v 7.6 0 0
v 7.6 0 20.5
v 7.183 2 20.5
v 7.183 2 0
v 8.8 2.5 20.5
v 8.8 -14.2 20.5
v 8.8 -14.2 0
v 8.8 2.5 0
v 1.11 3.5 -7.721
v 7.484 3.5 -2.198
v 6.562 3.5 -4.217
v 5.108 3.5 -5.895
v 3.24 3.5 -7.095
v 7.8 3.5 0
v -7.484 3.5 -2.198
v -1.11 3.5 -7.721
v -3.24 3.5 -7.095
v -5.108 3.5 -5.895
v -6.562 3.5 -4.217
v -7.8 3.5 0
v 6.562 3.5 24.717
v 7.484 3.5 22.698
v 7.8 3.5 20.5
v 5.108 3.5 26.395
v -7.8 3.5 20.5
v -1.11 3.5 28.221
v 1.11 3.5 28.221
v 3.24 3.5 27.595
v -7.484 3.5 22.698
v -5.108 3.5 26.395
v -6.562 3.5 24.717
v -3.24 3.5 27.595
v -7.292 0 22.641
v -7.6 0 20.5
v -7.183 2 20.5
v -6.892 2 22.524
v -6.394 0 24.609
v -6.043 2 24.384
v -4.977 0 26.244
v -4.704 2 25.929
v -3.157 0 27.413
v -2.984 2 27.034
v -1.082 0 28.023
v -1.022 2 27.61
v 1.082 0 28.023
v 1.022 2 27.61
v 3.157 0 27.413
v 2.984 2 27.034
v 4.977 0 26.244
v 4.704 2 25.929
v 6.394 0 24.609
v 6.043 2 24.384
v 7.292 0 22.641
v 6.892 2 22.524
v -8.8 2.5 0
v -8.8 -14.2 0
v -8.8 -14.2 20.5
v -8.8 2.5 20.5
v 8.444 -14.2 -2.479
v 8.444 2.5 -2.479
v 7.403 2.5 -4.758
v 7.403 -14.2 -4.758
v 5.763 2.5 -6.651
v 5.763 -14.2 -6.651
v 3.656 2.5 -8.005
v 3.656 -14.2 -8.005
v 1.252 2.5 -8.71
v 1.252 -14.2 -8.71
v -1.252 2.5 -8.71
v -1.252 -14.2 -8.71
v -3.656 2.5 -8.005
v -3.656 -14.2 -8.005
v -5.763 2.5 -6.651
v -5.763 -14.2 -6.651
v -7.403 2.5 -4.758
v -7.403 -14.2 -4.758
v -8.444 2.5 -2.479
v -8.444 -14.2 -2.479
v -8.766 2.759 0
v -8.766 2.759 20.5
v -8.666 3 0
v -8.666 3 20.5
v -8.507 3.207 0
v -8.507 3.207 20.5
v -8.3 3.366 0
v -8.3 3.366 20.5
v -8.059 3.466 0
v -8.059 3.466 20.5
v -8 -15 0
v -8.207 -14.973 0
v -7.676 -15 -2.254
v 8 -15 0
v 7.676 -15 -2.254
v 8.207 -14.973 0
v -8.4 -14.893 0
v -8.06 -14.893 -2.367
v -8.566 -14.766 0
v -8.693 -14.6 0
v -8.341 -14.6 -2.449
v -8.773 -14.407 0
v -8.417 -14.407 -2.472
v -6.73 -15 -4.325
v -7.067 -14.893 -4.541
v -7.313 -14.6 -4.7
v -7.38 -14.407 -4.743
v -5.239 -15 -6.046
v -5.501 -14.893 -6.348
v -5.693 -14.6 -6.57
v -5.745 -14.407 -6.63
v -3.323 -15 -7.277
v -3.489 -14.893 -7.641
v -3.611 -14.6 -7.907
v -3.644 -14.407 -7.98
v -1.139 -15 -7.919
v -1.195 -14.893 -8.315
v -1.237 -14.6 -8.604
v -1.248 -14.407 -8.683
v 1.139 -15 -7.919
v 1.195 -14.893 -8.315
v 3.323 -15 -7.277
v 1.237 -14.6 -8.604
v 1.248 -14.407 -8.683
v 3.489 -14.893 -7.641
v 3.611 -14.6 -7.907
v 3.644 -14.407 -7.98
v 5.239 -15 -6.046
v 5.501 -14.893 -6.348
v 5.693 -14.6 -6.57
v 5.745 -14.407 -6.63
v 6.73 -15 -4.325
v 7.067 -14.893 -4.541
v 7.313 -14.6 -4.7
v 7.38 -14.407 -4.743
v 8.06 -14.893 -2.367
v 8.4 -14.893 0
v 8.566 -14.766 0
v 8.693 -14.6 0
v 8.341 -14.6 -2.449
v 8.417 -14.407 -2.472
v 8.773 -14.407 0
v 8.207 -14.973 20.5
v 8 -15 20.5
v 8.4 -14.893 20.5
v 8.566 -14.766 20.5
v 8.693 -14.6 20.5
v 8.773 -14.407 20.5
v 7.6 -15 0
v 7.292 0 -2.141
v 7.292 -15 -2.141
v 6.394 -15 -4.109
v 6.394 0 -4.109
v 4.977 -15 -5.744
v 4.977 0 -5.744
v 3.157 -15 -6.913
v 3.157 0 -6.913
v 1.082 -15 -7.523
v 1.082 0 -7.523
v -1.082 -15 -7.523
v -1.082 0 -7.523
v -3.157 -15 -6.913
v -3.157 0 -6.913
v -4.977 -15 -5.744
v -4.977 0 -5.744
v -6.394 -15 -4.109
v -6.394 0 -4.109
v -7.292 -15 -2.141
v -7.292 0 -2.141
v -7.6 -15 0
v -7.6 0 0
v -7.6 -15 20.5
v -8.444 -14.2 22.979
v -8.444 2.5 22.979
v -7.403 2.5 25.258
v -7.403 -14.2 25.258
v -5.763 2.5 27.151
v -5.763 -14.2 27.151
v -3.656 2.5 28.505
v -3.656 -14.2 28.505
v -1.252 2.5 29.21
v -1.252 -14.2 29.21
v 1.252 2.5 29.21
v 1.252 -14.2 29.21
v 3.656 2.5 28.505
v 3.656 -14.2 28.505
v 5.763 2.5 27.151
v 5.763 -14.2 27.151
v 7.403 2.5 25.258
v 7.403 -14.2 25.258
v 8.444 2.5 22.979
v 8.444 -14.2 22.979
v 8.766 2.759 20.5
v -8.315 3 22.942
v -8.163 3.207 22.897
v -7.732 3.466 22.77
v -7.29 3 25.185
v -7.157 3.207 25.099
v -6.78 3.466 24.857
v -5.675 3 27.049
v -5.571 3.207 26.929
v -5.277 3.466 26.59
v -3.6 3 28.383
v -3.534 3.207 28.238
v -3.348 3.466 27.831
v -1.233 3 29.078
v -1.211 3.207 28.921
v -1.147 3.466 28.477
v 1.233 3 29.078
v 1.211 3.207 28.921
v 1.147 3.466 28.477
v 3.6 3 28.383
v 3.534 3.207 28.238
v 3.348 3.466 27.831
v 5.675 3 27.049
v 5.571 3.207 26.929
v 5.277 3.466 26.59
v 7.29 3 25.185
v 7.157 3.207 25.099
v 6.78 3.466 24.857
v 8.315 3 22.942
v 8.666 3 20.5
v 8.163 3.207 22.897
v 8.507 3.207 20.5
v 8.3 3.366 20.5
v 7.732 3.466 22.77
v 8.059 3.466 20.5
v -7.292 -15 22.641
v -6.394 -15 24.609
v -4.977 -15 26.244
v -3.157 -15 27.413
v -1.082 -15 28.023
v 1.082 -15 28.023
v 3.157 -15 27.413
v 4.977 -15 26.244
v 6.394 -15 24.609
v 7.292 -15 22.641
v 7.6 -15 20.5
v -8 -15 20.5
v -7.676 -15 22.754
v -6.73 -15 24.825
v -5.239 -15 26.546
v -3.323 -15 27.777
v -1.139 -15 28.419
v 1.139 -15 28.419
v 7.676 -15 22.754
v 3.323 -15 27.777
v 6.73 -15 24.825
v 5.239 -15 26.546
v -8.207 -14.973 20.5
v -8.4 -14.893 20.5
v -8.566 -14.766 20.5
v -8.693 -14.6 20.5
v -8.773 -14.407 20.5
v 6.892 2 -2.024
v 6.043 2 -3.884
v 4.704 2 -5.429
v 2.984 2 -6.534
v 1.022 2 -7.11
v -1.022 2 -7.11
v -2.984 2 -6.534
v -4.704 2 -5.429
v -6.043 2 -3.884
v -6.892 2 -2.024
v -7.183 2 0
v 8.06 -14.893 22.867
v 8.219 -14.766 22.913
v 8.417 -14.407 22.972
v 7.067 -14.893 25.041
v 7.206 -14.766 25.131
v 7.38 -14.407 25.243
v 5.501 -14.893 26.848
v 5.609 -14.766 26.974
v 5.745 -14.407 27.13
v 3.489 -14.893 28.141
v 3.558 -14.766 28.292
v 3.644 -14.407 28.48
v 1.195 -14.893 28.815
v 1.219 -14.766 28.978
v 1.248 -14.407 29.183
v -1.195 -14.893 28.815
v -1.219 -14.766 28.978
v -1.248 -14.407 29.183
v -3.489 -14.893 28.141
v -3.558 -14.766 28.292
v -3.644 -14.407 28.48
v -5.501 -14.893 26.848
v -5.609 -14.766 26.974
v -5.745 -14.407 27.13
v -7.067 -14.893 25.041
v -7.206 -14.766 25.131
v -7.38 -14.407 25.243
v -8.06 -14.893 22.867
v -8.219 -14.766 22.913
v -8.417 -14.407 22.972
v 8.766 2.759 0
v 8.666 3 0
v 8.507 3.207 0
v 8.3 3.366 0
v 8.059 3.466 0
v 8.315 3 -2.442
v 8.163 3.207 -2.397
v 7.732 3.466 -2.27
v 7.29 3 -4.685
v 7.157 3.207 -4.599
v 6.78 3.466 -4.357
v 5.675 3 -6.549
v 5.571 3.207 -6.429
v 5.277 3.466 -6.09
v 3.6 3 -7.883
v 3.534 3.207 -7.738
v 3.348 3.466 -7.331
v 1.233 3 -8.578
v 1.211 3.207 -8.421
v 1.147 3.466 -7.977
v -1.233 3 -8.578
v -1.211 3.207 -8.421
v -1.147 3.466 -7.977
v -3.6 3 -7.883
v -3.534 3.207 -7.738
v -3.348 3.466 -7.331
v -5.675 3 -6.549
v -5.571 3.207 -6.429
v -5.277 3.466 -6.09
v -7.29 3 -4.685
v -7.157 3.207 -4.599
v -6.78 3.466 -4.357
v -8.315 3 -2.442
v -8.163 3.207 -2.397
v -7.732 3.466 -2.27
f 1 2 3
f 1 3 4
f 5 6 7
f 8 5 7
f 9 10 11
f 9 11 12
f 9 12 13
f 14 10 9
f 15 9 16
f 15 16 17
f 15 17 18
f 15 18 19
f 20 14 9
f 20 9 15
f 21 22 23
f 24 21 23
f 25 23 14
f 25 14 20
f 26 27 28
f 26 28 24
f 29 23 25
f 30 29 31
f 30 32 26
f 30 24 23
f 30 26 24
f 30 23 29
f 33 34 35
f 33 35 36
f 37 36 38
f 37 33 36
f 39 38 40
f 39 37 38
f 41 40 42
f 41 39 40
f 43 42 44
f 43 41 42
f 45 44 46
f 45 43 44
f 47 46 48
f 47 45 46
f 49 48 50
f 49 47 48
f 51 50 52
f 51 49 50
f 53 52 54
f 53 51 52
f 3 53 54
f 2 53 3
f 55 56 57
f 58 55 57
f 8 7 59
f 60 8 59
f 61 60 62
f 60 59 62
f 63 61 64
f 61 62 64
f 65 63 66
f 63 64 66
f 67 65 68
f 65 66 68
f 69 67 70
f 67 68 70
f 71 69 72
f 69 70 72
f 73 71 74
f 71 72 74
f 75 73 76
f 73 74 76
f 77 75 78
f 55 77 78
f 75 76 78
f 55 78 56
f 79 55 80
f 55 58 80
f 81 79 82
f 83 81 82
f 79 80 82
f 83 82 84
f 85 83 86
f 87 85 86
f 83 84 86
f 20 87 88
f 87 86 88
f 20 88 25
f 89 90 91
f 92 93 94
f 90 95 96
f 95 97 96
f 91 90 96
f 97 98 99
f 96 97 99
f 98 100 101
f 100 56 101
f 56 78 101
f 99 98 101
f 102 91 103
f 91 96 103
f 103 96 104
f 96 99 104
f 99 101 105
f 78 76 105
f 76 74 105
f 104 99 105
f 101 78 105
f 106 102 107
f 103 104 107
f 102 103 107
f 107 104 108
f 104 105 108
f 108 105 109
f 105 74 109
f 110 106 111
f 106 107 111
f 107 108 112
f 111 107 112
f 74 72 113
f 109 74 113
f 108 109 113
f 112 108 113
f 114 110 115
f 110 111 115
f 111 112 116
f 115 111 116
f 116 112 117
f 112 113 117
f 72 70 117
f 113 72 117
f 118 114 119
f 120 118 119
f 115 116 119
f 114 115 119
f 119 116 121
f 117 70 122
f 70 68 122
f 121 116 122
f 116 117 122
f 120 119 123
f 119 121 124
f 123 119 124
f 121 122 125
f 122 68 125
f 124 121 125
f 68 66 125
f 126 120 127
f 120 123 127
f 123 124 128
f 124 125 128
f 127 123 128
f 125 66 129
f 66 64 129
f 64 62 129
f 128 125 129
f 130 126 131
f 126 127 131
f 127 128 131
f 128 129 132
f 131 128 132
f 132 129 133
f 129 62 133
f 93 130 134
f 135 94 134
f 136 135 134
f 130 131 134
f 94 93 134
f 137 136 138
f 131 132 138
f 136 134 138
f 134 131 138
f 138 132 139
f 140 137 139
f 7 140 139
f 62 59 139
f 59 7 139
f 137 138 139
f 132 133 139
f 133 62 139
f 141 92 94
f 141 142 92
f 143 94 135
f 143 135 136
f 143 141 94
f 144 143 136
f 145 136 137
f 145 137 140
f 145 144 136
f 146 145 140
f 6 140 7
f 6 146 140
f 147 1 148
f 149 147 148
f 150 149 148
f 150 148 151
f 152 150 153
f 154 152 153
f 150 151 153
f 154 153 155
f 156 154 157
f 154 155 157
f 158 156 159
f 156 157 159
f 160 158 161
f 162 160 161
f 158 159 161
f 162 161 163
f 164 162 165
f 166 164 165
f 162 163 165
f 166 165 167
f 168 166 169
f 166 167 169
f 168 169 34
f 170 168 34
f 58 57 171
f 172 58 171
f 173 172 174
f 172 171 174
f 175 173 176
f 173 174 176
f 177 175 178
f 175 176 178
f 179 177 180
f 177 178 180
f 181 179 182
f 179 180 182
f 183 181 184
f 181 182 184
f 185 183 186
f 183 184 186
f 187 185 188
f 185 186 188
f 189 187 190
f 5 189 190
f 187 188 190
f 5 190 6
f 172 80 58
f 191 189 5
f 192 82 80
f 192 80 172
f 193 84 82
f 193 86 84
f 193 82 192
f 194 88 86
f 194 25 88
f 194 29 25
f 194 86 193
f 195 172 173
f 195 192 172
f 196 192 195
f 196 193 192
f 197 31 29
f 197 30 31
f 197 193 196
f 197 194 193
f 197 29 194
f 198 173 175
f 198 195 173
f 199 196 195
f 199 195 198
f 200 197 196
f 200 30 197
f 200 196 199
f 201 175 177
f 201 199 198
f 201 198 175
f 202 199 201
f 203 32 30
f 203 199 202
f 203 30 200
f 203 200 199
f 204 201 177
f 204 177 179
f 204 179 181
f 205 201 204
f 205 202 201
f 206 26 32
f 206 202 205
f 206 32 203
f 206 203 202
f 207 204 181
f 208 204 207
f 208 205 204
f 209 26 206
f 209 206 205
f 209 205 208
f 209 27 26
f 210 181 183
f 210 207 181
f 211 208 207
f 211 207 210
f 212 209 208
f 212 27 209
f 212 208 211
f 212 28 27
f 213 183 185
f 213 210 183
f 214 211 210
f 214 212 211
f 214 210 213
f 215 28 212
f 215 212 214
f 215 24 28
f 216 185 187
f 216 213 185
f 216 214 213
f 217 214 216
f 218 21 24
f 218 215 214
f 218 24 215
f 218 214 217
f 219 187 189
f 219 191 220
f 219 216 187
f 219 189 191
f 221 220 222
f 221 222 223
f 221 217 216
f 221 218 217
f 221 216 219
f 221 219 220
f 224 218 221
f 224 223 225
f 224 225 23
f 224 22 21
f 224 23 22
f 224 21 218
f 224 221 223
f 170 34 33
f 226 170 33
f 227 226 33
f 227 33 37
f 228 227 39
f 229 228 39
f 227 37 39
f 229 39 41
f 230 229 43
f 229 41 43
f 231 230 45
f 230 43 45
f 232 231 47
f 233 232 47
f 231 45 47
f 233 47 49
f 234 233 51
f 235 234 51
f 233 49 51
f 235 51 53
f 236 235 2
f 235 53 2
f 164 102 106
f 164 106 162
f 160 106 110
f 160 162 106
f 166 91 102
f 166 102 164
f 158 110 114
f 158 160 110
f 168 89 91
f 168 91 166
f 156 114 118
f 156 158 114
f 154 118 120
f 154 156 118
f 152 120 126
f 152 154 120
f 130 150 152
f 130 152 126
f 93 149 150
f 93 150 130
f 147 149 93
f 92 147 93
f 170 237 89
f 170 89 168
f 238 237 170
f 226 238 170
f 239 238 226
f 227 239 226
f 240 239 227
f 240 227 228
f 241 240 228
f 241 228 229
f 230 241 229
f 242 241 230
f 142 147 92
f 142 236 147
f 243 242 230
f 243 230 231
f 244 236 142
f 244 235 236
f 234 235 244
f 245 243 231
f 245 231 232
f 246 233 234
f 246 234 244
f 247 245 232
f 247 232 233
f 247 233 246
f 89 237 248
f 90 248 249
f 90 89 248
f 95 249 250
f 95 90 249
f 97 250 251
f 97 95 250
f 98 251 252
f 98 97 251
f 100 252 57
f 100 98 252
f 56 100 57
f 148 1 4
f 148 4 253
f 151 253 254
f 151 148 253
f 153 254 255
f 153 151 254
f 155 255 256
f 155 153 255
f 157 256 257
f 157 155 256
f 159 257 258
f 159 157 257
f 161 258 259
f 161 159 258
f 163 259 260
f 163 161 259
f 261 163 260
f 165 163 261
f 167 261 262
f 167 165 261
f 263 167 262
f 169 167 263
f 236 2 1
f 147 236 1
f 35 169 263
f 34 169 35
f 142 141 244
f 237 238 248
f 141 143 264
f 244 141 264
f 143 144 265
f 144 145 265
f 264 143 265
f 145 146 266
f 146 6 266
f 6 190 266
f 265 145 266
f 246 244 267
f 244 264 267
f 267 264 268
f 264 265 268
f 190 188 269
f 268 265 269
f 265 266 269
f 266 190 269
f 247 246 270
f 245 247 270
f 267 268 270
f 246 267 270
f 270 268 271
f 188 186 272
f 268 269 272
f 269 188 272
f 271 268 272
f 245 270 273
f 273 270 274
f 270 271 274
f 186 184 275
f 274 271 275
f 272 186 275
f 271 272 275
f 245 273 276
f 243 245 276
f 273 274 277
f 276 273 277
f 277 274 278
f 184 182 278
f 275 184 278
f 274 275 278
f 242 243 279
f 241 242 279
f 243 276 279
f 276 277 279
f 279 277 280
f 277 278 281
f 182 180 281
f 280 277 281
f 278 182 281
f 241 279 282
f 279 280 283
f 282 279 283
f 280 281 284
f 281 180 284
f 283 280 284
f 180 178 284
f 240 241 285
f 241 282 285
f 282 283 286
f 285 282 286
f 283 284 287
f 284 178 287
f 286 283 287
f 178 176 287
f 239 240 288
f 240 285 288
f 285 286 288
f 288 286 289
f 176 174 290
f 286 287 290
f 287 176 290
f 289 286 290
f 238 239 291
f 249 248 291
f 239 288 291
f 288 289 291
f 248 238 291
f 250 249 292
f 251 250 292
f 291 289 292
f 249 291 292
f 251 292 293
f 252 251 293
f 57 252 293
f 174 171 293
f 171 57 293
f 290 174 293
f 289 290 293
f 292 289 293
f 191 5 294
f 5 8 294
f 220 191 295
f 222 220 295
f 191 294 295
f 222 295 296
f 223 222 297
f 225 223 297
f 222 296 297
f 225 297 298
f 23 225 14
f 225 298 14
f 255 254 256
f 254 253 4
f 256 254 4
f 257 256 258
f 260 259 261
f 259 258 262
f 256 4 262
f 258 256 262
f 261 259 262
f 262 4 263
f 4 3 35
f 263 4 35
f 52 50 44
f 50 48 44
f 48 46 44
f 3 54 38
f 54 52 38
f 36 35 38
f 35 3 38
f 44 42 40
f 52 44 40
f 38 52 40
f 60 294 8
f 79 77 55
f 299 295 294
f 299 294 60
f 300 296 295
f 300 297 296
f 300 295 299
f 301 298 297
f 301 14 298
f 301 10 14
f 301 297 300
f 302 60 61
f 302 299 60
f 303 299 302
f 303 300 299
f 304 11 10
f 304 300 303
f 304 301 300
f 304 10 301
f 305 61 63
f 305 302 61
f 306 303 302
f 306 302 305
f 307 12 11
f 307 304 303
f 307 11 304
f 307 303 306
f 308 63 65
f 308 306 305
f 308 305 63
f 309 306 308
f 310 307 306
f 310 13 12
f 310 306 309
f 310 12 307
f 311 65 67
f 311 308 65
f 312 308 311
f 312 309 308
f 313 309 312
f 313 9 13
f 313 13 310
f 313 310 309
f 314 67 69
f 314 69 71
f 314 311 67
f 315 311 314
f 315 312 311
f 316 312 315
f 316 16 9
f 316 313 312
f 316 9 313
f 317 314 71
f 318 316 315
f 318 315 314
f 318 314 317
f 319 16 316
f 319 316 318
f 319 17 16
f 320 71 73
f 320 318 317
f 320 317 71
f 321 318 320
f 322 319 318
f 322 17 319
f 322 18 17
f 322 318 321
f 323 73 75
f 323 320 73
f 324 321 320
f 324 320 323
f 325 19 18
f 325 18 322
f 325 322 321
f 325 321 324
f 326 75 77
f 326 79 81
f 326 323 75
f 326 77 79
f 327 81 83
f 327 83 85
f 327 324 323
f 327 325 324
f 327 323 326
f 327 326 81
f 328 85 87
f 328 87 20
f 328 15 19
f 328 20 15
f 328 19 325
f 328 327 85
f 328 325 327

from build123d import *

# Parameters (mm, degrees)
F1_DEPTH  = 15
F5_DEPTH  = 2
F10_DEPTH = 1.5
F11_R     = 1
F12_R     = 0.8


with BuildPart() as f1:
    # F0 (on Front) → F1 (new body)
    with BuildSketch(Plane.XZ):
        with BuildLine():
            Line((8.8, 0), (8.8, 20.5))
            ThreePointArc((8.8, 20.5), (0, 29.3), (-8.8, 20.5))
            Line((-8.8, 20.5), (-8.8, 0))
            ThreePointArc((-8.8, 0), (0, -8.8), (8.8, 0))
        make_face()
        with BuildLine():
            ThreePointArc((-7.6, 20.5), (0, 28.1), (7.6, 20.5))
            Line((7.6, 20.5), (7.6, 0))
            ThreePointArc((7.6, 0), (0, -7.6), (-7.6, 0))
            Line((-7.6, 0), (-7.6, 20.5))
        make_face(mode=Mode.SUBTRACT)
    extrude(amount=F1_DEPTH)

    # F4 (on face) → F5 (join)
    with BuildSketch(Plane(origin=(0, 0, 0), x_dir=(-1, 0, 0), z_dir=(0, 1, 0))):
        with BuildLine():
            ThreePointArc((8.8, 20.5), (0, 29.3), (-8.8, 20.5))
            Line((-8.8, 20.5), (-8.8, 0))
            ThreePointArc((-8.8, 0), (0, -8.8), (8.8, 0))
            Line((8.8, 0), (8.8, 20.5))
        make_face()
    extrude(amount=F5_DEPTH)

    # F3 (on offset) → F8 section 0
    with BuildSketch(Plane(origin=(0, 2.4, 0), x_dir=(-1, 0, 0), z_dir=(0, 1, 0))):
        with BuildLine():
            ThreePointArc((7.1, 20.5), (0, 27.6), (-7.1, 20.5))
            Line((-7.1, 20.5), (-7.1, 0))
            ThreePointArc((-7.1, 0), (0, -7.1), (7.1, 0))
            Line((7.1, 0), (7.1, 20.5))
        make_face()
    # F7 (on offset) → F8 section 1
    with BuildSketch(Plane(origin=(0, 0, 0), x_dir=(-1, 0, 0), z_dir=(0, 1, 0))):
        with BuildLine():
            Line((7.6, 0), (7.6, 20.5))
            ThreePointArc((7.6, 20.5), (0, 28.1), (-7.6, 20.5))
            Line((-7.6, 20.5), (-7.6, 0))
            ThreePointArc((-7.6, 0), (0, -7.6), (7.6, 0))
        make_face()
    loft(mode=Mode.SUBTRACT)

    # F9 (on face) → F10 (join)
    with BuildSketch(Plane(origin=(0, 2, 0), x_dir=(-1, 0, 0), z_dir=(0, 1, 0))):
        with BuildLine():
            ThreePointArc((8.8, 20.5), (0, 29.3), (-8.8, 20.5))
            Line((-8.8, 20.5), (-8.8, 0))
            ThreePointArc((-8.8, 0), (0, -8.8), (8.8, 0))
            Line((8.8, 0), (8.8, 20.5))
        make_face()
    extrude(amount=F10_DEPTH)

    # F11
    f11_edges = [f1.edges().sort_by_distance(p)[0] for p in [
        (0, 3.5, -8.8),
    ]]
    fillet(f11_edges, radius=F11_R)

    # F12
    f12_edges = [f1.edges().sort_by_distance(p)[0] for p in [
        (8.8, -15, 10.25),
    ]]
    fillet(f12_edges, radius=F12_R)


solid = f1.part
